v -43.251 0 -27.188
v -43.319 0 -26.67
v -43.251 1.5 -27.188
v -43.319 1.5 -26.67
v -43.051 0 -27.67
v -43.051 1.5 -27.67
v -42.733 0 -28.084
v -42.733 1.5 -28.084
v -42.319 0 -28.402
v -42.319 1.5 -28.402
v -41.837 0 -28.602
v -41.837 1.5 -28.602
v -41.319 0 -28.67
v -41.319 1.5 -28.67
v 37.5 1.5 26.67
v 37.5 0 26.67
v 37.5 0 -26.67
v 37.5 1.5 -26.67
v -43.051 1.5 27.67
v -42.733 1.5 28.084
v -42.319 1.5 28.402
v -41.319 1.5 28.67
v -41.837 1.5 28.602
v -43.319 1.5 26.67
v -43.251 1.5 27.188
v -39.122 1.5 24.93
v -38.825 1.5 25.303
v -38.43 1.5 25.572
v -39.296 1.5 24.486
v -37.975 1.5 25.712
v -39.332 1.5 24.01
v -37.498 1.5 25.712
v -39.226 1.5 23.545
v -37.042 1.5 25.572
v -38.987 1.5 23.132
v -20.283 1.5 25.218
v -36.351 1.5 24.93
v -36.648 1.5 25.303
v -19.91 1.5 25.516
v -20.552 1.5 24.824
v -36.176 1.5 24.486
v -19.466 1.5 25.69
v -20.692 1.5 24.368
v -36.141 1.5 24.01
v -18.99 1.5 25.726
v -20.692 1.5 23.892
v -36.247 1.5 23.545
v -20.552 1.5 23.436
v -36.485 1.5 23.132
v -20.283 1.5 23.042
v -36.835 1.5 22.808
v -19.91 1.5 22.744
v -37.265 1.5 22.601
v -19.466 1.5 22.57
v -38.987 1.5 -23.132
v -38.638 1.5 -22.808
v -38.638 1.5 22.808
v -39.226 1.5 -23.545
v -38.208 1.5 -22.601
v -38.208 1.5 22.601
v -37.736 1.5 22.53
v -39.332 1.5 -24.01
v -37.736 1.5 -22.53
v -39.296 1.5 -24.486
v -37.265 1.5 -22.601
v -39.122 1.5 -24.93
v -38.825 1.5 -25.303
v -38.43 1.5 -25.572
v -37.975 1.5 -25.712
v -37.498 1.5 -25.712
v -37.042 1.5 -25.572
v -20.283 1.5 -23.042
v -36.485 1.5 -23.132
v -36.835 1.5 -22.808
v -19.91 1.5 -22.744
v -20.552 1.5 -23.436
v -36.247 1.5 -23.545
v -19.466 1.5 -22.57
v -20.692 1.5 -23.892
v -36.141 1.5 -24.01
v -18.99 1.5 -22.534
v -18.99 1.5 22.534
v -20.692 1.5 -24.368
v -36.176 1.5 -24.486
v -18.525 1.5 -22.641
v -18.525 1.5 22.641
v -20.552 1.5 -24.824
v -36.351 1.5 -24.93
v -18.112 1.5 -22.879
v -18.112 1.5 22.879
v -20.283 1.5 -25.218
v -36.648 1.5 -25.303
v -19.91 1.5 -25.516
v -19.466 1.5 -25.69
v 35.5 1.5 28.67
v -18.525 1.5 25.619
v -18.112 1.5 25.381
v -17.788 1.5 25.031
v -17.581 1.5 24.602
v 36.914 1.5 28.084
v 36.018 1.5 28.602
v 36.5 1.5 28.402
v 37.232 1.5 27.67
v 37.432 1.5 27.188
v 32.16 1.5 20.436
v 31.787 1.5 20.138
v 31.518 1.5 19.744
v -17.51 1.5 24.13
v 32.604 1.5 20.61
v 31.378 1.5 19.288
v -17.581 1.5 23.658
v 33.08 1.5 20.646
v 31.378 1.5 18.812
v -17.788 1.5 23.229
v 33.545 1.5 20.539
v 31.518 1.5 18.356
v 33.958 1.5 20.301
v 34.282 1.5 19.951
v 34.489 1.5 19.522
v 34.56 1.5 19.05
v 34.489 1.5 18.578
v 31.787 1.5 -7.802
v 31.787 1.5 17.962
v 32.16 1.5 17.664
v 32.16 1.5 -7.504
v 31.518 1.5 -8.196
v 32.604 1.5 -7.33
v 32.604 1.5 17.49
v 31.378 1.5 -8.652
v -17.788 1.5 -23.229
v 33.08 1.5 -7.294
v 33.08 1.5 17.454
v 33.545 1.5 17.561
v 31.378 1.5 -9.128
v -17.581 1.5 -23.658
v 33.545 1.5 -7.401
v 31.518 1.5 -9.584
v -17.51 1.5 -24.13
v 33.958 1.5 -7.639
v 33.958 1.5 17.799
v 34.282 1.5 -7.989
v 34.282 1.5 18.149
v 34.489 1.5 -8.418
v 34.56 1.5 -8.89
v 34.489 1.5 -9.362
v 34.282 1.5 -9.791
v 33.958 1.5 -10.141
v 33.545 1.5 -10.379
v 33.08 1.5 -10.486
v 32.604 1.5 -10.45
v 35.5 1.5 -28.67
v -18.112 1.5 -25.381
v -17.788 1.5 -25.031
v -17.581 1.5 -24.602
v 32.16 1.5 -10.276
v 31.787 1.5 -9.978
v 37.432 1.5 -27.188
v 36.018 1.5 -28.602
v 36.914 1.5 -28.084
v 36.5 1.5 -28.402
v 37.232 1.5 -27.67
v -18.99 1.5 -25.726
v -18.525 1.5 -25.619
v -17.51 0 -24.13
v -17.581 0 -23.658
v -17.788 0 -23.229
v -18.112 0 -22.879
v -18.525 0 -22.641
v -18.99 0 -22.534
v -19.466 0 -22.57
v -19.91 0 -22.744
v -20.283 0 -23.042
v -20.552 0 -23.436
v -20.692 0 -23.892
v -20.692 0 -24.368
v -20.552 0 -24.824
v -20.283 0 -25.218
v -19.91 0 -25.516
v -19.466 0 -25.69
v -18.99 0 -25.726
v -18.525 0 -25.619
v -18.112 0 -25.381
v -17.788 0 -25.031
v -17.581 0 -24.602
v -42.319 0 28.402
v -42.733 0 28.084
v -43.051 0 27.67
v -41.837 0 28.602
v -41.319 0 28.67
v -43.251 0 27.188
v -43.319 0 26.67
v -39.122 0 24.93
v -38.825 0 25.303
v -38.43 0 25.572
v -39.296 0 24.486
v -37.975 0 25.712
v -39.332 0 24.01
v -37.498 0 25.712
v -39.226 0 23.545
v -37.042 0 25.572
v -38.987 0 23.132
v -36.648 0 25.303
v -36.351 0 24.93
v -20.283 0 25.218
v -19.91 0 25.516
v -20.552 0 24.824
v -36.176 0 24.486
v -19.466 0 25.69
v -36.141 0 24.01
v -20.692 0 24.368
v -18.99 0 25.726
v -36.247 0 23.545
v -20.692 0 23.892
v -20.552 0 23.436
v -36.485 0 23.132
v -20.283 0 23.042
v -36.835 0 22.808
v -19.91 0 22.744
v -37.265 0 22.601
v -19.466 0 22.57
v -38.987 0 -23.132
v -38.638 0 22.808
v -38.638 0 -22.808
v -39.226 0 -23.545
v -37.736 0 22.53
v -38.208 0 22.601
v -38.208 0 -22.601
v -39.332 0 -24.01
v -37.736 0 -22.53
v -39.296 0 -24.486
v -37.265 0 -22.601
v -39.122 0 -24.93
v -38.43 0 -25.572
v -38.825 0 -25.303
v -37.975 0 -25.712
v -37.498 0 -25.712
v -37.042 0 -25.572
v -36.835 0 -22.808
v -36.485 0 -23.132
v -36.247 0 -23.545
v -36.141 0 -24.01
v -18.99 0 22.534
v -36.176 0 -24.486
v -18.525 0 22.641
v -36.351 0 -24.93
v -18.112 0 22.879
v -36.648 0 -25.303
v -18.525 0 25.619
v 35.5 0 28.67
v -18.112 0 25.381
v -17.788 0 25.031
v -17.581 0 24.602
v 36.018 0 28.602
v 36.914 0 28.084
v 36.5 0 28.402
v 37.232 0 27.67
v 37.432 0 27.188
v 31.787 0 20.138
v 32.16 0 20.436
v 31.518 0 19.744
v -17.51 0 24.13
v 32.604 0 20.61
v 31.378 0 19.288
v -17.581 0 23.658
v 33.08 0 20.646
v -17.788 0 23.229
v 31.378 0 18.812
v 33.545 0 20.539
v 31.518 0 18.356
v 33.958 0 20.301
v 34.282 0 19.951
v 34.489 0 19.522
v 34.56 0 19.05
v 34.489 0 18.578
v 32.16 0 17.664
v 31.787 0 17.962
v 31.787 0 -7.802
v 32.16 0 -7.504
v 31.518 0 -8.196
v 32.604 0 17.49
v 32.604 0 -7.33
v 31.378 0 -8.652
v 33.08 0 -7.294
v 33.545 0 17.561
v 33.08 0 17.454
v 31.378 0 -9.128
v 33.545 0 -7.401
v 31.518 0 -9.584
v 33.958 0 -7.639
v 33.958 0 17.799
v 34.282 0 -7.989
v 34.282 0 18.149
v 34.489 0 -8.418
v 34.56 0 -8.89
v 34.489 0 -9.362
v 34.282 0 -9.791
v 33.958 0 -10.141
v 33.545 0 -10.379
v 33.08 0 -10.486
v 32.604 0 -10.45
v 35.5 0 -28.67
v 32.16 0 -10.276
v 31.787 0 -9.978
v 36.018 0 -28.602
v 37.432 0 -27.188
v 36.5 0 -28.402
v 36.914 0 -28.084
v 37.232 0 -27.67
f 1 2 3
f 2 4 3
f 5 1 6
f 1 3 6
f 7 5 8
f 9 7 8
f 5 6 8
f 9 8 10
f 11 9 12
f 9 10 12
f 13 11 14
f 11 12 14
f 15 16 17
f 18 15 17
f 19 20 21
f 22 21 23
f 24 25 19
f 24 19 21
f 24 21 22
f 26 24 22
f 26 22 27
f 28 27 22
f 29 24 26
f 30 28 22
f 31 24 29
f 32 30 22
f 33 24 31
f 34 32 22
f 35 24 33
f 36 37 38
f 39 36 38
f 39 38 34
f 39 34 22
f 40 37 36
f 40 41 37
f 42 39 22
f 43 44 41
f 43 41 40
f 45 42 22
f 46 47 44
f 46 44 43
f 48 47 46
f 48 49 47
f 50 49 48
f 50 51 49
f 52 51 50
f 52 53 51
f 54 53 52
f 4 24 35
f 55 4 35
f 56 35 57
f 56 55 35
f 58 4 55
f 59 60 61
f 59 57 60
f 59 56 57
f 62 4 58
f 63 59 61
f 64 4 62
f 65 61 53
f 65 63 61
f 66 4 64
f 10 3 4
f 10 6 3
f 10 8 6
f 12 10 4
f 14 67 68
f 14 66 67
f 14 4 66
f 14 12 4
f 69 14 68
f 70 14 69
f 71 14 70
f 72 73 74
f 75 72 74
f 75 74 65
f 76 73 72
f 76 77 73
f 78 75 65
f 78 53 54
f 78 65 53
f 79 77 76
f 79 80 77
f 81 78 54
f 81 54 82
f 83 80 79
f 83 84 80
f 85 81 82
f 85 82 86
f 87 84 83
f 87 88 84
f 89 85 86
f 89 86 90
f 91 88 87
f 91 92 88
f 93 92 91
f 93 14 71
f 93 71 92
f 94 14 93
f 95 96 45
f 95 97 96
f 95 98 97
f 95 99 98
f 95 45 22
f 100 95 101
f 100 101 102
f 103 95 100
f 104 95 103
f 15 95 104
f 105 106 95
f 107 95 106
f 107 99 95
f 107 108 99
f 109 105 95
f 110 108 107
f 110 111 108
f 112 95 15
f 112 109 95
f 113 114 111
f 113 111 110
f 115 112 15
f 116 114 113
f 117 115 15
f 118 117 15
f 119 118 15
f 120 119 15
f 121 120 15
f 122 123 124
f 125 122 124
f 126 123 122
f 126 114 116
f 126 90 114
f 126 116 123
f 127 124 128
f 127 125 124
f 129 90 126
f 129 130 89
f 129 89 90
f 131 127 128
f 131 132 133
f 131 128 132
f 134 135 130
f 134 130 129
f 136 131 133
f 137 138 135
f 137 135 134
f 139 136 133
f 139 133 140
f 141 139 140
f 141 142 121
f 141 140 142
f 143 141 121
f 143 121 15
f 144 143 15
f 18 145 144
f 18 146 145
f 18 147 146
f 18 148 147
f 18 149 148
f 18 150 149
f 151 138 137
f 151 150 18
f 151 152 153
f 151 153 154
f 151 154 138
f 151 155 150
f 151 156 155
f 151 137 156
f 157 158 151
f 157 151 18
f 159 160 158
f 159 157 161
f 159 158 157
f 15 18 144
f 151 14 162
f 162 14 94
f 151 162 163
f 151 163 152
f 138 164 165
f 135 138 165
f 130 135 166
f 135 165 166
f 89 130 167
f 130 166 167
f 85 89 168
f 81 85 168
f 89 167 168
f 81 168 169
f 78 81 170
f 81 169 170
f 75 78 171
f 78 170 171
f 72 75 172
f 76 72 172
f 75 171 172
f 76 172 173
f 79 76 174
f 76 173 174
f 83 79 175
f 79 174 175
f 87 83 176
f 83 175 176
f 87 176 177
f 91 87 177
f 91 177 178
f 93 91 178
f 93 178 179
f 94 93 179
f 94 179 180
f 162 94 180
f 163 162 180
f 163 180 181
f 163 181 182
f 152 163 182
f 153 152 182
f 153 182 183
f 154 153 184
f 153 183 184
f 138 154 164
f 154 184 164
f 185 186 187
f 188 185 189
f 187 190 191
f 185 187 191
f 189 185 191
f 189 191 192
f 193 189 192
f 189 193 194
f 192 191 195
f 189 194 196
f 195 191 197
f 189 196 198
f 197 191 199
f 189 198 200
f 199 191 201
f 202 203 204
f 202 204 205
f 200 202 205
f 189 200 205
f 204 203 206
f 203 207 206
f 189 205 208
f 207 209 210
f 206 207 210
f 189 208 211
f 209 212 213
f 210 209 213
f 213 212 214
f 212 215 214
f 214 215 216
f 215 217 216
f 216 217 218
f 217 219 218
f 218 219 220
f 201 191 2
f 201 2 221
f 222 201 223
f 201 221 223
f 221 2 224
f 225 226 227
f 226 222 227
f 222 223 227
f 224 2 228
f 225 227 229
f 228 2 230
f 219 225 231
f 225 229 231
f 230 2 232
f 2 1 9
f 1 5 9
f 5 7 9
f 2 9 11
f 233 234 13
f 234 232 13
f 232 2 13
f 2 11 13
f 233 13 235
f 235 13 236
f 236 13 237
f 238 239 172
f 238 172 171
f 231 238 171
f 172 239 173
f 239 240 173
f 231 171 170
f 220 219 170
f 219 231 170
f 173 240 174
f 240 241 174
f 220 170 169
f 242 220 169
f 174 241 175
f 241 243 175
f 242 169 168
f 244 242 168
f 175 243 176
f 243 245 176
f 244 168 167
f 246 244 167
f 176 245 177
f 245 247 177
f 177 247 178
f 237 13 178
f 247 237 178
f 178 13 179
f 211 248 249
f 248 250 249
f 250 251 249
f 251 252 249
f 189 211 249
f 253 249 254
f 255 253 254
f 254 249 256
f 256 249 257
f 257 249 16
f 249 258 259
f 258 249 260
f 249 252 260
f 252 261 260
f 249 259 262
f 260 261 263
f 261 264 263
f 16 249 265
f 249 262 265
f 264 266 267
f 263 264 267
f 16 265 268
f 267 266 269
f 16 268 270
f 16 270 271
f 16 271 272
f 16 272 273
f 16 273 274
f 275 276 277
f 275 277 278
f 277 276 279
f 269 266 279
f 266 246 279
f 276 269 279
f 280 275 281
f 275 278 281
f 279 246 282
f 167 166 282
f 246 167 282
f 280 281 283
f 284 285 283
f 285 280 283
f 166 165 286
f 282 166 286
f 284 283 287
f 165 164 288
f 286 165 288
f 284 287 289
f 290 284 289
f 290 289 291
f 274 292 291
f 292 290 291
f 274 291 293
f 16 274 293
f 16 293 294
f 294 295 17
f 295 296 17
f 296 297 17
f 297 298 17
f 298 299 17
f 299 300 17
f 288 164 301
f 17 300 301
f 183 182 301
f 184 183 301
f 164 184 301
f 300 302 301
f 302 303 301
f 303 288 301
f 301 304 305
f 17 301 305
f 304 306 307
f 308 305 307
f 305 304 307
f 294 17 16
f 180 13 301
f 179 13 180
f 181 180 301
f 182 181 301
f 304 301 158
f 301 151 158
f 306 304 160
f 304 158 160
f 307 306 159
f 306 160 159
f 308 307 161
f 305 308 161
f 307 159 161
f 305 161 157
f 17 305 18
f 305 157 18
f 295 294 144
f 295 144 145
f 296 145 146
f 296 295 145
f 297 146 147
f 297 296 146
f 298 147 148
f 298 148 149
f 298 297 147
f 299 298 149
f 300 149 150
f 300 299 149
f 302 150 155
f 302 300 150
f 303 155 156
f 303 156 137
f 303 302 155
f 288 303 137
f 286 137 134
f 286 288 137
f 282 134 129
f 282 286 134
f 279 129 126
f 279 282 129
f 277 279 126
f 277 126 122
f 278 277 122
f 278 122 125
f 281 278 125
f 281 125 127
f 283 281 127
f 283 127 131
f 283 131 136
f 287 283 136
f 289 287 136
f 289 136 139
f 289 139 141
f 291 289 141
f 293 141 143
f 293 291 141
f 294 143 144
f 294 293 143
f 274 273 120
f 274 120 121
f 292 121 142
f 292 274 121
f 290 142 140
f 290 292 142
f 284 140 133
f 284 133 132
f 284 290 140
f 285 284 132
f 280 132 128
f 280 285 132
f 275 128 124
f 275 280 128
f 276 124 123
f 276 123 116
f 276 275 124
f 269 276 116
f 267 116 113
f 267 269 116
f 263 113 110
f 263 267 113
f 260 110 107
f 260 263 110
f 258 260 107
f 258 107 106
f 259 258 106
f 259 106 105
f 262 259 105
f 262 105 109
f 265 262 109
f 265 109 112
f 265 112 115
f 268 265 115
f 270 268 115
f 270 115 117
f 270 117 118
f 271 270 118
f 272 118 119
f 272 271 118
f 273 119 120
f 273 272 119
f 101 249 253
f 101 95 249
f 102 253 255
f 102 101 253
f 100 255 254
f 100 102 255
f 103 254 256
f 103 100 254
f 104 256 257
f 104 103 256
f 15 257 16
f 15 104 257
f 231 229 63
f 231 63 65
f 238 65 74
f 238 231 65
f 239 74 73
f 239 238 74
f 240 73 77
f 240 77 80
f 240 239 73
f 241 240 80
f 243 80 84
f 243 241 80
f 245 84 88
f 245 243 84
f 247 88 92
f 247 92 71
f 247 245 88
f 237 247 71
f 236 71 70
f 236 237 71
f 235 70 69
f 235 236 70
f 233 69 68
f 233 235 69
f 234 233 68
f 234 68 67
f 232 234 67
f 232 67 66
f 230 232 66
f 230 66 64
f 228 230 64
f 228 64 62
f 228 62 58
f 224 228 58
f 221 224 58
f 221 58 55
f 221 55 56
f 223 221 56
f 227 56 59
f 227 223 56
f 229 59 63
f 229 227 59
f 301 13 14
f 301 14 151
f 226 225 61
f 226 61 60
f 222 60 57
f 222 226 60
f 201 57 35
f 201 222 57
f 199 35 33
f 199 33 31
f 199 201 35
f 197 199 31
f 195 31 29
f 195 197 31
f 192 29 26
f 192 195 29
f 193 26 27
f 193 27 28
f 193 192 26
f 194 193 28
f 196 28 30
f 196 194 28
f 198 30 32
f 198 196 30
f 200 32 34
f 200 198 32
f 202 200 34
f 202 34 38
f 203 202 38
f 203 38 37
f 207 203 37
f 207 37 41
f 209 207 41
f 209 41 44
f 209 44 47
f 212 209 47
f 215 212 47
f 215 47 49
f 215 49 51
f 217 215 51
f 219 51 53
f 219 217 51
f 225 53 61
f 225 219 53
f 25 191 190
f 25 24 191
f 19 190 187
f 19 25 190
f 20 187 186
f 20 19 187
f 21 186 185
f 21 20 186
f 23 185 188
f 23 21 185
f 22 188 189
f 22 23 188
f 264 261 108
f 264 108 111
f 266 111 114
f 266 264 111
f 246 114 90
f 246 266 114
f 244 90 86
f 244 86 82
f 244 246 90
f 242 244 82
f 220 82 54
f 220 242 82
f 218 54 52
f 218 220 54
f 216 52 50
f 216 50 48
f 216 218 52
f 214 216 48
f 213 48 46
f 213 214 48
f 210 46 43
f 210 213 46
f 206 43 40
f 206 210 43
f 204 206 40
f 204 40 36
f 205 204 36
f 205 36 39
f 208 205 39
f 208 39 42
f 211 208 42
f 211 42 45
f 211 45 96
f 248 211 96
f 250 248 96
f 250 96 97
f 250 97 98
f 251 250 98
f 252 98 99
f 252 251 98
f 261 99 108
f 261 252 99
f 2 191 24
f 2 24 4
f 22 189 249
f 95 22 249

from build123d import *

# Parameters (mm, degrees)
SKETCH_2_W      = 80.819107854
SKETCH_2_H      = 57.34
SKETCH_2_R      = 1.6
EXTRUDE_1_DEPTH = 1.5
FILLET_1_R      = 2


with BuildPart() as part:
    # 스케치2 → 보스-돌출1 (new body)
    with BuildSketch(Plane(origin=(0, 0, 0), x_dir=(1, 0, 0), z_dir=(0, 1, 0))):
        with Locations((-2.909553927, 0)):
            Rectangle(SKETCH_2_W, SKETCH_2_H)
        with Locations(Location((-37.73627176, 24.13, 0), (0, 0, 270))):
            Circle(SKETCH_2_R, mode=Mode.SUBTRACT)
        with Locations(Location((-37.73627176, -24.13, 0), (0, 0, 90))):
            Circle(SKETCH_2_R, mode=Mode.SUBTRACT)
        with BuildLine():
            ThreePointArc((31.36, 8.89), (32.96, 7.29), (34.56, 8.89))
            ThreePointArc((34.56, 8.89), (32.96, 10.49), (31.36, 8.89))
        make_face(mode=Mode.SUBTRACT)
        with BuildLine():
            ThreePointArc((31.36, -19.05), (32.96, -20.65), (34.56, -19.05))
            ThreePointArc((34.56, -19.05), (32.96, -17.45), (31.36, -19.05))
        make_face(mode=Mode.SUBTRACT)
        with BuildLine():
            ThreePointArc((-20.71, -24.13), (-19.11, -25.73), (-17.51, -24.13))
            ThreePointArc((-17.51, -24.13), (-19.11, -22.53), (-20.71, -24.13))
        make_face(mode=Mode.SUBTRACT)
        with BuildLine():
            ThreePointArc((-20.71, 24.13), (-19.11, 25.73), (-17.51, 24.13))
            ThreePointArc((-17.51, 24.13), (-19.11, 22.53), (-20.71, 24.13))
        make_face(mode=Mode.SUBTRACT)
    extrude(amount=EXTRUDE_1_DEPTH)

    # 필렛1
    fillet_1_edges = [part.edges().sort_by_distance(p)[0] for p in [
        (37.5, 0.75, 28.67),
        (-43.319107854, 0.75, 28.67),
        (-43.319107854, 0.75, -28.67),
        (37.5, 0.75, -28.67),
    ]]
    fillet(fillet_1_edges, radius=FILLET_1_R)


solid = part.part
